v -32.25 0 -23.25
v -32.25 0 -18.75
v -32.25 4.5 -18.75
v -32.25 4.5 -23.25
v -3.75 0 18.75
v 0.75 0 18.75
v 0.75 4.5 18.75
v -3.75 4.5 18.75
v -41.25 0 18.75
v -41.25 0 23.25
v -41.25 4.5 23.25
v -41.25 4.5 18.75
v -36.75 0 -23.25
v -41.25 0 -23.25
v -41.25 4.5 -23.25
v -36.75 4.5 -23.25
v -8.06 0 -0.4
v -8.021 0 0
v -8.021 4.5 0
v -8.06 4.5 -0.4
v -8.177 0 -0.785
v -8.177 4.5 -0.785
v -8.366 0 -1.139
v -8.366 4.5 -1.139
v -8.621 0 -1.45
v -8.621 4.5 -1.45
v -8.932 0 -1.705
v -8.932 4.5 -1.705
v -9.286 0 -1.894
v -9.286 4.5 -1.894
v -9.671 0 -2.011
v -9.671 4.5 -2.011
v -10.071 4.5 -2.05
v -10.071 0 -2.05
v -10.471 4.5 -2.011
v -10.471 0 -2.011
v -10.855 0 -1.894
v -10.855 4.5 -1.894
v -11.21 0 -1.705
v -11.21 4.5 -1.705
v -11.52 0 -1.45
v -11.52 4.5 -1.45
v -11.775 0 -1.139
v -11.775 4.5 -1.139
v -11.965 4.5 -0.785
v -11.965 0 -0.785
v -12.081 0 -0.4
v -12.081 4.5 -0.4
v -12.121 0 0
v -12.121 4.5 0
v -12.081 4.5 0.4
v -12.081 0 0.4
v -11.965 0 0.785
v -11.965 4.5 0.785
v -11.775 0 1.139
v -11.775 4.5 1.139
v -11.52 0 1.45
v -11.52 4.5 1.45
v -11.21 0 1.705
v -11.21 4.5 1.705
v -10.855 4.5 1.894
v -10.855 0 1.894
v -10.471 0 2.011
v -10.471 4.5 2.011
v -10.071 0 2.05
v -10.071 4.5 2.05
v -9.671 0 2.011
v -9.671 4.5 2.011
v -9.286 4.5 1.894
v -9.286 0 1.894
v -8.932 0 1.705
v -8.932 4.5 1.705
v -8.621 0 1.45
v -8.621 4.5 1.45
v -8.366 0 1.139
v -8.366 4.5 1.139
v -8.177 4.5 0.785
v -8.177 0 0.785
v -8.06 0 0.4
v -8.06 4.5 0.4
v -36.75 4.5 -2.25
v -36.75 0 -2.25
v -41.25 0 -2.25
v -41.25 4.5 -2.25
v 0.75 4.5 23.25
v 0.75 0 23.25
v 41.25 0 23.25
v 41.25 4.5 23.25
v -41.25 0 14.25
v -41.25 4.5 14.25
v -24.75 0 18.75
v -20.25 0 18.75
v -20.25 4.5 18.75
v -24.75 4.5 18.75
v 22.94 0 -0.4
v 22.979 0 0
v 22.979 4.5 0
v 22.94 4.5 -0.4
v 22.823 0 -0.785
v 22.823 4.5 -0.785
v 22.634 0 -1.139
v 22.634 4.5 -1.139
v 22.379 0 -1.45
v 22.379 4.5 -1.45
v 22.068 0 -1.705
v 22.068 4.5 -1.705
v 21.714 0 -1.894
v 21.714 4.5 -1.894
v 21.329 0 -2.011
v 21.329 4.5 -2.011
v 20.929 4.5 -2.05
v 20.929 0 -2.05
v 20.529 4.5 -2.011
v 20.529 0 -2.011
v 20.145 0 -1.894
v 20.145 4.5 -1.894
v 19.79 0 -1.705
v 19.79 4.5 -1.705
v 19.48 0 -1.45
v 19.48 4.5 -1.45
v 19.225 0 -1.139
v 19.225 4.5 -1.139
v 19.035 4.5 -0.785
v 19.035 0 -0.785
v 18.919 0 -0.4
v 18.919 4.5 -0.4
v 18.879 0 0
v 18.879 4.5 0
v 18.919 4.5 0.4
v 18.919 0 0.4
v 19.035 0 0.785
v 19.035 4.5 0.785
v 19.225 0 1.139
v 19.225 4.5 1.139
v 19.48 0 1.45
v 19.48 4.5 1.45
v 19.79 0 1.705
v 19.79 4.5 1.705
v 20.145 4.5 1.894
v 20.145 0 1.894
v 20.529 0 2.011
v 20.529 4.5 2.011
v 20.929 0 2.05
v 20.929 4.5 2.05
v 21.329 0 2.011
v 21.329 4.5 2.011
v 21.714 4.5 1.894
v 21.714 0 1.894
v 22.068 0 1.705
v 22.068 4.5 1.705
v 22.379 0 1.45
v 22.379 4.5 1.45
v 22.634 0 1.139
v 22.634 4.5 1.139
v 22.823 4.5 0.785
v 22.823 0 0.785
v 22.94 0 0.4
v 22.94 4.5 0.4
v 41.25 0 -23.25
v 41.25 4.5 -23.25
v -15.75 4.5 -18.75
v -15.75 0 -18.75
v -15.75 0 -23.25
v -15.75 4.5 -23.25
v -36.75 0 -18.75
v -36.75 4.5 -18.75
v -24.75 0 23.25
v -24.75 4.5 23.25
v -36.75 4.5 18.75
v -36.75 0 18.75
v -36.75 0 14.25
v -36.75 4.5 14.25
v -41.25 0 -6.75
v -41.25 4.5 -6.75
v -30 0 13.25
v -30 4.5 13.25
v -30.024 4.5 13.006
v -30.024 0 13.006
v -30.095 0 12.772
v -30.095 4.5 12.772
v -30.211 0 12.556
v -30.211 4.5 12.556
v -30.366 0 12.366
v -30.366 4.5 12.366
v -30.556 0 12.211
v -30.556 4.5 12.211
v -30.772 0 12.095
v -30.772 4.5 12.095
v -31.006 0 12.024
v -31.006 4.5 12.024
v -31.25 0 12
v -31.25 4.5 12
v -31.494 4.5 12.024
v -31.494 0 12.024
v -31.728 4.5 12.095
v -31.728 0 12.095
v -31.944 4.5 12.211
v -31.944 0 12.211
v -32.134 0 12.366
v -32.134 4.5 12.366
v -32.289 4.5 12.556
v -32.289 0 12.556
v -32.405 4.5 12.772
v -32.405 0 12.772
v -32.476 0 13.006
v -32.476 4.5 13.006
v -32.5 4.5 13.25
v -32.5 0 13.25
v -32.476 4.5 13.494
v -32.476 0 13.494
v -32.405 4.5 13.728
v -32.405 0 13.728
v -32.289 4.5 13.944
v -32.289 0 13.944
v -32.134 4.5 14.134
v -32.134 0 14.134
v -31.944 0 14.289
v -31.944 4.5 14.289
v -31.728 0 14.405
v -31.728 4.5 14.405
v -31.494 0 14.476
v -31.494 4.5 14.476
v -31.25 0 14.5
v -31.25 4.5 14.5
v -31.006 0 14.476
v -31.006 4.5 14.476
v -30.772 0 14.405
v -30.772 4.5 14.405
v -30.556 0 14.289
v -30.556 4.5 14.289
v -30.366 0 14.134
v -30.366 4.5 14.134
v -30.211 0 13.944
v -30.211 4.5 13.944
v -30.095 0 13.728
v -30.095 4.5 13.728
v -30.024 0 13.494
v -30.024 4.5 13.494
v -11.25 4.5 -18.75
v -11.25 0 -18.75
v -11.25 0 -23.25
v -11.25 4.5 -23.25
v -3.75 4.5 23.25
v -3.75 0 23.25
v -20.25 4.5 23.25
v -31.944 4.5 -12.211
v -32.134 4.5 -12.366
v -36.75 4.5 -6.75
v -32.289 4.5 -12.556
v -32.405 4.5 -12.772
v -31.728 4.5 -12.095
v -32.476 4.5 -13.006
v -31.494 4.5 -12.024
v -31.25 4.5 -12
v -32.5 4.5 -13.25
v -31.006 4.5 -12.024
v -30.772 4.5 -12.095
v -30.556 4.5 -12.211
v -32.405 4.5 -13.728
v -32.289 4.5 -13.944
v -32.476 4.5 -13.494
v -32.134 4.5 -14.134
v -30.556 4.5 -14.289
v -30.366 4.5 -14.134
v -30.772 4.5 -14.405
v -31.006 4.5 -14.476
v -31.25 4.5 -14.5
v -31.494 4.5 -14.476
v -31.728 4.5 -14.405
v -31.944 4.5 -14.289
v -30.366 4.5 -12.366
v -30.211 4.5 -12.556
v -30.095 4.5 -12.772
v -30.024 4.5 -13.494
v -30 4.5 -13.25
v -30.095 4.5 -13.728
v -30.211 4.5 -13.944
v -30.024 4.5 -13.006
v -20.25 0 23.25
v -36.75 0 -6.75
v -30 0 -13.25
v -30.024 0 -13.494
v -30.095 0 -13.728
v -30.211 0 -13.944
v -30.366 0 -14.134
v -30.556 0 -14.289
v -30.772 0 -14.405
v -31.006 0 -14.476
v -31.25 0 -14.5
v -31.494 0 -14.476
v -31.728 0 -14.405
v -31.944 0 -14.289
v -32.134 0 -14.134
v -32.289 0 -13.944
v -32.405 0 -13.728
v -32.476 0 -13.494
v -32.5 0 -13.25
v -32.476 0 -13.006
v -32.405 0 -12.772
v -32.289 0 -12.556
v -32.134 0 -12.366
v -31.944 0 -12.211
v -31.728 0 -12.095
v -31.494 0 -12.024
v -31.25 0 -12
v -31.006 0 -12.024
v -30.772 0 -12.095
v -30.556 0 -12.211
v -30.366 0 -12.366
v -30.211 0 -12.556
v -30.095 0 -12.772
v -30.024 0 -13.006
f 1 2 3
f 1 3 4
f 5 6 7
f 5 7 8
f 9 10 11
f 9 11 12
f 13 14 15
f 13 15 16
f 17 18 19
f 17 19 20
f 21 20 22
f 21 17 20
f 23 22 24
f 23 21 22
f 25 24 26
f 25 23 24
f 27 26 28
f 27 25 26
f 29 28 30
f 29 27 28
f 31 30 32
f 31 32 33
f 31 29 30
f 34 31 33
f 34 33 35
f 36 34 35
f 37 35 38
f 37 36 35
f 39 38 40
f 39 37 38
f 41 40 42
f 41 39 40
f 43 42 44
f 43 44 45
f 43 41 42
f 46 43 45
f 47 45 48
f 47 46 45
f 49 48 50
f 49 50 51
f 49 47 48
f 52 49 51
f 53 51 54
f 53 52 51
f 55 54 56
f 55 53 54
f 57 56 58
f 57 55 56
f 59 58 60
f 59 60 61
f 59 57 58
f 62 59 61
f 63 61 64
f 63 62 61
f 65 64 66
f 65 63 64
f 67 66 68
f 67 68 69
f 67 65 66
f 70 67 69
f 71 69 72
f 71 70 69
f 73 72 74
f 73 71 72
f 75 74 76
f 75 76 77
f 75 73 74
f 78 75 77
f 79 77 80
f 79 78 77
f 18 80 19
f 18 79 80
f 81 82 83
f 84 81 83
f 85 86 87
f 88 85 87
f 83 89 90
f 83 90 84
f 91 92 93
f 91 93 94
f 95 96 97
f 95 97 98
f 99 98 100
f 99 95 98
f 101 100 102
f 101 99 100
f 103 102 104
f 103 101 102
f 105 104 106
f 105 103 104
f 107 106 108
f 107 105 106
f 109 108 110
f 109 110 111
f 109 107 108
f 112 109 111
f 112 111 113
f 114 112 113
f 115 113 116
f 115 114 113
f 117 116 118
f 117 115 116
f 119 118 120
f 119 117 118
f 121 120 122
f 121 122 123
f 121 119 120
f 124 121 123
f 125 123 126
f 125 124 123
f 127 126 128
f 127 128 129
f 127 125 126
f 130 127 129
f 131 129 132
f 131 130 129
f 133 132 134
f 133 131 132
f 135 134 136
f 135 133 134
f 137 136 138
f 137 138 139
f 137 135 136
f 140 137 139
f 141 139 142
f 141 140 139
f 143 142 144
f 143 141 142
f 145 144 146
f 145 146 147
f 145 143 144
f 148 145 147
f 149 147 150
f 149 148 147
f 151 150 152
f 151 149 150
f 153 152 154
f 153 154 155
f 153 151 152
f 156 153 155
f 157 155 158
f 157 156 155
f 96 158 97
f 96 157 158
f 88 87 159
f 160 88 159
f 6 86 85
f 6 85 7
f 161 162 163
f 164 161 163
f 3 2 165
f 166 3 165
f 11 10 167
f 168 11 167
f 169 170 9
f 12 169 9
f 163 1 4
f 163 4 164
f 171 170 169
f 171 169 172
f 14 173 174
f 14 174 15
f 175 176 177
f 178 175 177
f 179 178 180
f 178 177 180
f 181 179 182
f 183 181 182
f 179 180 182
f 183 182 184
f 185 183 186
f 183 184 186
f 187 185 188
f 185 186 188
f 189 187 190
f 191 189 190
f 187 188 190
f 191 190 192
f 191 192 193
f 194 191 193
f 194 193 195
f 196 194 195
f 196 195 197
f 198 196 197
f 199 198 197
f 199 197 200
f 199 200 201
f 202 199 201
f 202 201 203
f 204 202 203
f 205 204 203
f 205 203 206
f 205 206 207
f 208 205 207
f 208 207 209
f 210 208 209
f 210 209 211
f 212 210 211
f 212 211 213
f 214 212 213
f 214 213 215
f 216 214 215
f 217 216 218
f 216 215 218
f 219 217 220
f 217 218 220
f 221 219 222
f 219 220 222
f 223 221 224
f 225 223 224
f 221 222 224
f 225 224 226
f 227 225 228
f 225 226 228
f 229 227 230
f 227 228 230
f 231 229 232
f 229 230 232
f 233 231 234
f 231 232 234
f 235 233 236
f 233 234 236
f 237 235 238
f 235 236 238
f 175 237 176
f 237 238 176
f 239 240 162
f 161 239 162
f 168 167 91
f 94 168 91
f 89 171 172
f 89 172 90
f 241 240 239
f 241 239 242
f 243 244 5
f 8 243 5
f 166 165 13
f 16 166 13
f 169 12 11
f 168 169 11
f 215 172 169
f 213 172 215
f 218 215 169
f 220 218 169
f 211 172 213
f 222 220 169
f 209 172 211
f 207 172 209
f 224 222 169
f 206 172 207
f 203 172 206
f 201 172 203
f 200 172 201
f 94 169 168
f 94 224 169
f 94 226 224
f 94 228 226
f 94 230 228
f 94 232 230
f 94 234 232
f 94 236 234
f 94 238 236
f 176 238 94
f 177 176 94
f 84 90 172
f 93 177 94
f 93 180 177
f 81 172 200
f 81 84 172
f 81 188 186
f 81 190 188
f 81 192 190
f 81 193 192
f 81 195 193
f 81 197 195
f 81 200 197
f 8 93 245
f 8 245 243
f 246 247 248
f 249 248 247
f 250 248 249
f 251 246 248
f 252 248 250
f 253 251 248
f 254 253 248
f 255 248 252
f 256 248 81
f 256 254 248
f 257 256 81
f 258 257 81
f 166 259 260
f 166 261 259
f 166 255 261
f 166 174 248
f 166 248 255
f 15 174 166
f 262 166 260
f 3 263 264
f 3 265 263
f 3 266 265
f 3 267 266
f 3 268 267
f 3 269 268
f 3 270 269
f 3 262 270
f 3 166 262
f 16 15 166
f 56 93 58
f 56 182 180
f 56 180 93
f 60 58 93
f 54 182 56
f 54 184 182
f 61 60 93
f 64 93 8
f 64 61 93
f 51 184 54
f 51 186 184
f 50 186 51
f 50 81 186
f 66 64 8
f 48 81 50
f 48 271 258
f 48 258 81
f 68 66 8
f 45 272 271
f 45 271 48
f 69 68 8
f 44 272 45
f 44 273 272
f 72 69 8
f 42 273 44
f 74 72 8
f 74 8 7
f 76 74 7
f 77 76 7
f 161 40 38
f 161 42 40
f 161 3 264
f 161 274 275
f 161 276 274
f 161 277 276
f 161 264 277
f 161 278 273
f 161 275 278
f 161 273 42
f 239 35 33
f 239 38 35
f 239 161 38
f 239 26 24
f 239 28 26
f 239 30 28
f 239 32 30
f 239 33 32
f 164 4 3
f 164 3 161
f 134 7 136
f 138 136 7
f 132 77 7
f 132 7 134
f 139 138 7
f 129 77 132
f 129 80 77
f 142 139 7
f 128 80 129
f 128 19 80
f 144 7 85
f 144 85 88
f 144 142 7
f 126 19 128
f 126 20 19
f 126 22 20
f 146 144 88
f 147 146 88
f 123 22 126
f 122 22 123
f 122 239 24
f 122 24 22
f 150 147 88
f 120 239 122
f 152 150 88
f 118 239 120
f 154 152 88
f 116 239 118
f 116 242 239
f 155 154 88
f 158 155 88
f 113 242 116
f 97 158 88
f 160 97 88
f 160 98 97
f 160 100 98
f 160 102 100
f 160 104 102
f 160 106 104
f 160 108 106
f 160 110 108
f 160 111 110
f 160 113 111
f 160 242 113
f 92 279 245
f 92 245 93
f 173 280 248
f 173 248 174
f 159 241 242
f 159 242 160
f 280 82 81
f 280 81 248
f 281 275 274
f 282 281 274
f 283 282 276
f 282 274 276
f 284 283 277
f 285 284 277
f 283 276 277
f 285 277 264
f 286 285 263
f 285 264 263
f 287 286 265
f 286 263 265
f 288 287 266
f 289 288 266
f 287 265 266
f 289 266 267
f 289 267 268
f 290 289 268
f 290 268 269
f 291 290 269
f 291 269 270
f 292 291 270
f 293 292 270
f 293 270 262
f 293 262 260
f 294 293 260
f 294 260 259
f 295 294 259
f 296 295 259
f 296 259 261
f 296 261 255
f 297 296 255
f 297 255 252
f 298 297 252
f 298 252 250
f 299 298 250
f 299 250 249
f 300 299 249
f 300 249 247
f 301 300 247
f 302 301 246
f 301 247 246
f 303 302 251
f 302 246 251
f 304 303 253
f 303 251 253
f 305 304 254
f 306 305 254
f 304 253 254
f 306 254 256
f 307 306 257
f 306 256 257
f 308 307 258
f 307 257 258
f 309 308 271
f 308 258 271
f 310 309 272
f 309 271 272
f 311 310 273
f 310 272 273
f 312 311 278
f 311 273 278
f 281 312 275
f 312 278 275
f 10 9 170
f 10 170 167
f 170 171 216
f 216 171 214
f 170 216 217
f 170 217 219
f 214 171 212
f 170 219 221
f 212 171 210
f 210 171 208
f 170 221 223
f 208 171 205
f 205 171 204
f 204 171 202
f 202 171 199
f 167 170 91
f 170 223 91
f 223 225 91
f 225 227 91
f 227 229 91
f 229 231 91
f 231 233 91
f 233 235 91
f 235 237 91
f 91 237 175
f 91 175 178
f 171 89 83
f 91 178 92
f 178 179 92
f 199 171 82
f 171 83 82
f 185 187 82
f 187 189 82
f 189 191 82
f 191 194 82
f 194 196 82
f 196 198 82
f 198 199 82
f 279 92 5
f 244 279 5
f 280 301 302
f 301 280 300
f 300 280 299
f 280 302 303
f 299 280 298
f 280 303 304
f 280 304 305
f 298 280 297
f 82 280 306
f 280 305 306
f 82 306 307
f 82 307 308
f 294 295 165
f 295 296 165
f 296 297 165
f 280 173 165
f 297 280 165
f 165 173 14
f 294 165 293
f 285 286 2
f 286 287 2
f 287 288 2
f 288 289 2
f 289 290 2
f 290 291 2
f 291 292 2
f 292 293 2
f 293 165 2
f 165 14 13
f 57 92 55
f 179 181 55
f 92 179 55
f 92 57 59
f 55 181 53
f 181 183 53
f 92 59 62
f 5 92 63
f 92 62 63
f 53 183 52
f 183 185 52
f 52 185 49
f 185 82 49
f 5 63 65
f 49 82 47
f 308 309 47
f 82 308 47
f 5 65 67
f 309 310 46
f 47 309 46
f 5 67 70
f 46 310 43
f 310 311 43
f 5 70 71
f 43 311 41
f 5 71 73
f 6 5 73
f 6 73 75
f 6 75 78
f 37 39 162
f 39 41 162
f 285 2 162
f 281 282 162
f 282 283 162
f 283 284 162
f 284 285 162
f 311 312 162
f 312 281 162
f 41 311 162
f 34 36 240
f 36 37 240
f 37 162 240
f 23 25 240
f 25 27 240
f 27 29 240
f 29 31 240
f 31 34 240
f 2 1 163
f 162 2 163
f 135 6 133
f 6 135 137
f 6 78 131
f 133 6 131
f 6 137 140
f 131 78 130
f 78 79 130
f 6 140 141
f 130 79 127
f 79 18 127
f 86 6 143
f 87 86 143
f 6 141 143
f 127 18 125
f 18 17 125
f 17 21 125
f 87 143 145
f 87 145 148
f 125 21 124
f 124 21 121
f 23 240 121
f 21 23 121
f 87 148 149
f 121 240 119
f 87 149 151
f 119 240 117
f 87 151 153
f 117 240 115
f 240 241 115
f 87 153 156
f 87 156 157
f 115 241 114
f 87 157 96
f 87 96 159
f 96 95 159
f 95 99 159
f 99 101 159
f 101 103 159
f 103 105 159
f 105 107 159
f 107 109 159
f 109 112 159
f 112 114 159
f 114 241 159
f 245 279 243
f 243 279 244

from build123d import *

# Parameters (mm, degrees)
SKETCH1_W           = 82.5
SKETCH1_H           = 46.5
SKETCH1_R           = 2.05
BOSS_EXTRUDE1_DEPTH = 4.5
SKETCH2_R           = 1.25
CUT_EXTRUDE1_DEPTH  = 5.5
SKETCH3_W           = 4.5
SKETCH3_H           = 4.5
CUT_EXTRUDE2_DEPTH  = 5.5


with BuildPart() as part:
    # Sketch1 → Boss-Extrude1 (new body)
    with BuildSketch(Plane(origin=(0, 0, 0), x_dir=(1, 0, 0), z_dir=(0, 1, 0))):
        Rectangle(SKETCH1_W, SKETCH1_H)
        with Locations((20.92918, 0)):
            Circle(SKETCH1_R, mode=Mode.SUBTRACT)
        with Locations((-10.07082, 0)):
            Circle(SKETCH1_R, mode=Mode.SUBTRACT)
    extrude(amount=BOSS_EXTRUDE1_DEPTH)

    # Sketch2 → Cut-Extrude1 (cut, through all)
    with BuildSketch(Plane(origin=(0, 4.5, 0), x_dir=(1, 0, 0), z_dir=(0, 1, 0))):
        with Locations((-31.25, -13.25)):
            Circle(SKETCH2_R)
        with Locations((-31.25, 13.25)):
            Circle(SKETCH2_R)
    extrude(amount=-CUT_EXTRUDE1_DEPTH, mode=Mode.SUBTRACT)

    # Sketch3 → Cut-Extrude2 (cut, through all)
    with BuildSketch(Plane(origin=(0, 0, 0), x_dir=(-1, 0, 0), z_dir=(0, -1, 0))):
        with Locations((34.5, 21)):
            Rectangle(SKETCH3_W, SKETCH3_H)
        with Locations((39, 4.5)):
            Rectangle(SKETCH3_W, SKETCH3_H)
        with Locations((39, -16.5)):
            Rectangle(SKETCH3_W, SKETCH3_H)
        with Locations((22.5, -21)):
            Rectangle(SKETCH3_W, SKETCH3_H)
        with Locations((1.5, -21)):
            Rectangle(SKETCH3_W, SKETCH3_H)
        with Locations((13.5, 21)):
            Rectangle(SKETCH3_W, SKETCH3_H)
    extrude(amount=-CUT_EXTRUDE2_DEPTH, mode=Mode.SUBTRACT)


solid = part.part
